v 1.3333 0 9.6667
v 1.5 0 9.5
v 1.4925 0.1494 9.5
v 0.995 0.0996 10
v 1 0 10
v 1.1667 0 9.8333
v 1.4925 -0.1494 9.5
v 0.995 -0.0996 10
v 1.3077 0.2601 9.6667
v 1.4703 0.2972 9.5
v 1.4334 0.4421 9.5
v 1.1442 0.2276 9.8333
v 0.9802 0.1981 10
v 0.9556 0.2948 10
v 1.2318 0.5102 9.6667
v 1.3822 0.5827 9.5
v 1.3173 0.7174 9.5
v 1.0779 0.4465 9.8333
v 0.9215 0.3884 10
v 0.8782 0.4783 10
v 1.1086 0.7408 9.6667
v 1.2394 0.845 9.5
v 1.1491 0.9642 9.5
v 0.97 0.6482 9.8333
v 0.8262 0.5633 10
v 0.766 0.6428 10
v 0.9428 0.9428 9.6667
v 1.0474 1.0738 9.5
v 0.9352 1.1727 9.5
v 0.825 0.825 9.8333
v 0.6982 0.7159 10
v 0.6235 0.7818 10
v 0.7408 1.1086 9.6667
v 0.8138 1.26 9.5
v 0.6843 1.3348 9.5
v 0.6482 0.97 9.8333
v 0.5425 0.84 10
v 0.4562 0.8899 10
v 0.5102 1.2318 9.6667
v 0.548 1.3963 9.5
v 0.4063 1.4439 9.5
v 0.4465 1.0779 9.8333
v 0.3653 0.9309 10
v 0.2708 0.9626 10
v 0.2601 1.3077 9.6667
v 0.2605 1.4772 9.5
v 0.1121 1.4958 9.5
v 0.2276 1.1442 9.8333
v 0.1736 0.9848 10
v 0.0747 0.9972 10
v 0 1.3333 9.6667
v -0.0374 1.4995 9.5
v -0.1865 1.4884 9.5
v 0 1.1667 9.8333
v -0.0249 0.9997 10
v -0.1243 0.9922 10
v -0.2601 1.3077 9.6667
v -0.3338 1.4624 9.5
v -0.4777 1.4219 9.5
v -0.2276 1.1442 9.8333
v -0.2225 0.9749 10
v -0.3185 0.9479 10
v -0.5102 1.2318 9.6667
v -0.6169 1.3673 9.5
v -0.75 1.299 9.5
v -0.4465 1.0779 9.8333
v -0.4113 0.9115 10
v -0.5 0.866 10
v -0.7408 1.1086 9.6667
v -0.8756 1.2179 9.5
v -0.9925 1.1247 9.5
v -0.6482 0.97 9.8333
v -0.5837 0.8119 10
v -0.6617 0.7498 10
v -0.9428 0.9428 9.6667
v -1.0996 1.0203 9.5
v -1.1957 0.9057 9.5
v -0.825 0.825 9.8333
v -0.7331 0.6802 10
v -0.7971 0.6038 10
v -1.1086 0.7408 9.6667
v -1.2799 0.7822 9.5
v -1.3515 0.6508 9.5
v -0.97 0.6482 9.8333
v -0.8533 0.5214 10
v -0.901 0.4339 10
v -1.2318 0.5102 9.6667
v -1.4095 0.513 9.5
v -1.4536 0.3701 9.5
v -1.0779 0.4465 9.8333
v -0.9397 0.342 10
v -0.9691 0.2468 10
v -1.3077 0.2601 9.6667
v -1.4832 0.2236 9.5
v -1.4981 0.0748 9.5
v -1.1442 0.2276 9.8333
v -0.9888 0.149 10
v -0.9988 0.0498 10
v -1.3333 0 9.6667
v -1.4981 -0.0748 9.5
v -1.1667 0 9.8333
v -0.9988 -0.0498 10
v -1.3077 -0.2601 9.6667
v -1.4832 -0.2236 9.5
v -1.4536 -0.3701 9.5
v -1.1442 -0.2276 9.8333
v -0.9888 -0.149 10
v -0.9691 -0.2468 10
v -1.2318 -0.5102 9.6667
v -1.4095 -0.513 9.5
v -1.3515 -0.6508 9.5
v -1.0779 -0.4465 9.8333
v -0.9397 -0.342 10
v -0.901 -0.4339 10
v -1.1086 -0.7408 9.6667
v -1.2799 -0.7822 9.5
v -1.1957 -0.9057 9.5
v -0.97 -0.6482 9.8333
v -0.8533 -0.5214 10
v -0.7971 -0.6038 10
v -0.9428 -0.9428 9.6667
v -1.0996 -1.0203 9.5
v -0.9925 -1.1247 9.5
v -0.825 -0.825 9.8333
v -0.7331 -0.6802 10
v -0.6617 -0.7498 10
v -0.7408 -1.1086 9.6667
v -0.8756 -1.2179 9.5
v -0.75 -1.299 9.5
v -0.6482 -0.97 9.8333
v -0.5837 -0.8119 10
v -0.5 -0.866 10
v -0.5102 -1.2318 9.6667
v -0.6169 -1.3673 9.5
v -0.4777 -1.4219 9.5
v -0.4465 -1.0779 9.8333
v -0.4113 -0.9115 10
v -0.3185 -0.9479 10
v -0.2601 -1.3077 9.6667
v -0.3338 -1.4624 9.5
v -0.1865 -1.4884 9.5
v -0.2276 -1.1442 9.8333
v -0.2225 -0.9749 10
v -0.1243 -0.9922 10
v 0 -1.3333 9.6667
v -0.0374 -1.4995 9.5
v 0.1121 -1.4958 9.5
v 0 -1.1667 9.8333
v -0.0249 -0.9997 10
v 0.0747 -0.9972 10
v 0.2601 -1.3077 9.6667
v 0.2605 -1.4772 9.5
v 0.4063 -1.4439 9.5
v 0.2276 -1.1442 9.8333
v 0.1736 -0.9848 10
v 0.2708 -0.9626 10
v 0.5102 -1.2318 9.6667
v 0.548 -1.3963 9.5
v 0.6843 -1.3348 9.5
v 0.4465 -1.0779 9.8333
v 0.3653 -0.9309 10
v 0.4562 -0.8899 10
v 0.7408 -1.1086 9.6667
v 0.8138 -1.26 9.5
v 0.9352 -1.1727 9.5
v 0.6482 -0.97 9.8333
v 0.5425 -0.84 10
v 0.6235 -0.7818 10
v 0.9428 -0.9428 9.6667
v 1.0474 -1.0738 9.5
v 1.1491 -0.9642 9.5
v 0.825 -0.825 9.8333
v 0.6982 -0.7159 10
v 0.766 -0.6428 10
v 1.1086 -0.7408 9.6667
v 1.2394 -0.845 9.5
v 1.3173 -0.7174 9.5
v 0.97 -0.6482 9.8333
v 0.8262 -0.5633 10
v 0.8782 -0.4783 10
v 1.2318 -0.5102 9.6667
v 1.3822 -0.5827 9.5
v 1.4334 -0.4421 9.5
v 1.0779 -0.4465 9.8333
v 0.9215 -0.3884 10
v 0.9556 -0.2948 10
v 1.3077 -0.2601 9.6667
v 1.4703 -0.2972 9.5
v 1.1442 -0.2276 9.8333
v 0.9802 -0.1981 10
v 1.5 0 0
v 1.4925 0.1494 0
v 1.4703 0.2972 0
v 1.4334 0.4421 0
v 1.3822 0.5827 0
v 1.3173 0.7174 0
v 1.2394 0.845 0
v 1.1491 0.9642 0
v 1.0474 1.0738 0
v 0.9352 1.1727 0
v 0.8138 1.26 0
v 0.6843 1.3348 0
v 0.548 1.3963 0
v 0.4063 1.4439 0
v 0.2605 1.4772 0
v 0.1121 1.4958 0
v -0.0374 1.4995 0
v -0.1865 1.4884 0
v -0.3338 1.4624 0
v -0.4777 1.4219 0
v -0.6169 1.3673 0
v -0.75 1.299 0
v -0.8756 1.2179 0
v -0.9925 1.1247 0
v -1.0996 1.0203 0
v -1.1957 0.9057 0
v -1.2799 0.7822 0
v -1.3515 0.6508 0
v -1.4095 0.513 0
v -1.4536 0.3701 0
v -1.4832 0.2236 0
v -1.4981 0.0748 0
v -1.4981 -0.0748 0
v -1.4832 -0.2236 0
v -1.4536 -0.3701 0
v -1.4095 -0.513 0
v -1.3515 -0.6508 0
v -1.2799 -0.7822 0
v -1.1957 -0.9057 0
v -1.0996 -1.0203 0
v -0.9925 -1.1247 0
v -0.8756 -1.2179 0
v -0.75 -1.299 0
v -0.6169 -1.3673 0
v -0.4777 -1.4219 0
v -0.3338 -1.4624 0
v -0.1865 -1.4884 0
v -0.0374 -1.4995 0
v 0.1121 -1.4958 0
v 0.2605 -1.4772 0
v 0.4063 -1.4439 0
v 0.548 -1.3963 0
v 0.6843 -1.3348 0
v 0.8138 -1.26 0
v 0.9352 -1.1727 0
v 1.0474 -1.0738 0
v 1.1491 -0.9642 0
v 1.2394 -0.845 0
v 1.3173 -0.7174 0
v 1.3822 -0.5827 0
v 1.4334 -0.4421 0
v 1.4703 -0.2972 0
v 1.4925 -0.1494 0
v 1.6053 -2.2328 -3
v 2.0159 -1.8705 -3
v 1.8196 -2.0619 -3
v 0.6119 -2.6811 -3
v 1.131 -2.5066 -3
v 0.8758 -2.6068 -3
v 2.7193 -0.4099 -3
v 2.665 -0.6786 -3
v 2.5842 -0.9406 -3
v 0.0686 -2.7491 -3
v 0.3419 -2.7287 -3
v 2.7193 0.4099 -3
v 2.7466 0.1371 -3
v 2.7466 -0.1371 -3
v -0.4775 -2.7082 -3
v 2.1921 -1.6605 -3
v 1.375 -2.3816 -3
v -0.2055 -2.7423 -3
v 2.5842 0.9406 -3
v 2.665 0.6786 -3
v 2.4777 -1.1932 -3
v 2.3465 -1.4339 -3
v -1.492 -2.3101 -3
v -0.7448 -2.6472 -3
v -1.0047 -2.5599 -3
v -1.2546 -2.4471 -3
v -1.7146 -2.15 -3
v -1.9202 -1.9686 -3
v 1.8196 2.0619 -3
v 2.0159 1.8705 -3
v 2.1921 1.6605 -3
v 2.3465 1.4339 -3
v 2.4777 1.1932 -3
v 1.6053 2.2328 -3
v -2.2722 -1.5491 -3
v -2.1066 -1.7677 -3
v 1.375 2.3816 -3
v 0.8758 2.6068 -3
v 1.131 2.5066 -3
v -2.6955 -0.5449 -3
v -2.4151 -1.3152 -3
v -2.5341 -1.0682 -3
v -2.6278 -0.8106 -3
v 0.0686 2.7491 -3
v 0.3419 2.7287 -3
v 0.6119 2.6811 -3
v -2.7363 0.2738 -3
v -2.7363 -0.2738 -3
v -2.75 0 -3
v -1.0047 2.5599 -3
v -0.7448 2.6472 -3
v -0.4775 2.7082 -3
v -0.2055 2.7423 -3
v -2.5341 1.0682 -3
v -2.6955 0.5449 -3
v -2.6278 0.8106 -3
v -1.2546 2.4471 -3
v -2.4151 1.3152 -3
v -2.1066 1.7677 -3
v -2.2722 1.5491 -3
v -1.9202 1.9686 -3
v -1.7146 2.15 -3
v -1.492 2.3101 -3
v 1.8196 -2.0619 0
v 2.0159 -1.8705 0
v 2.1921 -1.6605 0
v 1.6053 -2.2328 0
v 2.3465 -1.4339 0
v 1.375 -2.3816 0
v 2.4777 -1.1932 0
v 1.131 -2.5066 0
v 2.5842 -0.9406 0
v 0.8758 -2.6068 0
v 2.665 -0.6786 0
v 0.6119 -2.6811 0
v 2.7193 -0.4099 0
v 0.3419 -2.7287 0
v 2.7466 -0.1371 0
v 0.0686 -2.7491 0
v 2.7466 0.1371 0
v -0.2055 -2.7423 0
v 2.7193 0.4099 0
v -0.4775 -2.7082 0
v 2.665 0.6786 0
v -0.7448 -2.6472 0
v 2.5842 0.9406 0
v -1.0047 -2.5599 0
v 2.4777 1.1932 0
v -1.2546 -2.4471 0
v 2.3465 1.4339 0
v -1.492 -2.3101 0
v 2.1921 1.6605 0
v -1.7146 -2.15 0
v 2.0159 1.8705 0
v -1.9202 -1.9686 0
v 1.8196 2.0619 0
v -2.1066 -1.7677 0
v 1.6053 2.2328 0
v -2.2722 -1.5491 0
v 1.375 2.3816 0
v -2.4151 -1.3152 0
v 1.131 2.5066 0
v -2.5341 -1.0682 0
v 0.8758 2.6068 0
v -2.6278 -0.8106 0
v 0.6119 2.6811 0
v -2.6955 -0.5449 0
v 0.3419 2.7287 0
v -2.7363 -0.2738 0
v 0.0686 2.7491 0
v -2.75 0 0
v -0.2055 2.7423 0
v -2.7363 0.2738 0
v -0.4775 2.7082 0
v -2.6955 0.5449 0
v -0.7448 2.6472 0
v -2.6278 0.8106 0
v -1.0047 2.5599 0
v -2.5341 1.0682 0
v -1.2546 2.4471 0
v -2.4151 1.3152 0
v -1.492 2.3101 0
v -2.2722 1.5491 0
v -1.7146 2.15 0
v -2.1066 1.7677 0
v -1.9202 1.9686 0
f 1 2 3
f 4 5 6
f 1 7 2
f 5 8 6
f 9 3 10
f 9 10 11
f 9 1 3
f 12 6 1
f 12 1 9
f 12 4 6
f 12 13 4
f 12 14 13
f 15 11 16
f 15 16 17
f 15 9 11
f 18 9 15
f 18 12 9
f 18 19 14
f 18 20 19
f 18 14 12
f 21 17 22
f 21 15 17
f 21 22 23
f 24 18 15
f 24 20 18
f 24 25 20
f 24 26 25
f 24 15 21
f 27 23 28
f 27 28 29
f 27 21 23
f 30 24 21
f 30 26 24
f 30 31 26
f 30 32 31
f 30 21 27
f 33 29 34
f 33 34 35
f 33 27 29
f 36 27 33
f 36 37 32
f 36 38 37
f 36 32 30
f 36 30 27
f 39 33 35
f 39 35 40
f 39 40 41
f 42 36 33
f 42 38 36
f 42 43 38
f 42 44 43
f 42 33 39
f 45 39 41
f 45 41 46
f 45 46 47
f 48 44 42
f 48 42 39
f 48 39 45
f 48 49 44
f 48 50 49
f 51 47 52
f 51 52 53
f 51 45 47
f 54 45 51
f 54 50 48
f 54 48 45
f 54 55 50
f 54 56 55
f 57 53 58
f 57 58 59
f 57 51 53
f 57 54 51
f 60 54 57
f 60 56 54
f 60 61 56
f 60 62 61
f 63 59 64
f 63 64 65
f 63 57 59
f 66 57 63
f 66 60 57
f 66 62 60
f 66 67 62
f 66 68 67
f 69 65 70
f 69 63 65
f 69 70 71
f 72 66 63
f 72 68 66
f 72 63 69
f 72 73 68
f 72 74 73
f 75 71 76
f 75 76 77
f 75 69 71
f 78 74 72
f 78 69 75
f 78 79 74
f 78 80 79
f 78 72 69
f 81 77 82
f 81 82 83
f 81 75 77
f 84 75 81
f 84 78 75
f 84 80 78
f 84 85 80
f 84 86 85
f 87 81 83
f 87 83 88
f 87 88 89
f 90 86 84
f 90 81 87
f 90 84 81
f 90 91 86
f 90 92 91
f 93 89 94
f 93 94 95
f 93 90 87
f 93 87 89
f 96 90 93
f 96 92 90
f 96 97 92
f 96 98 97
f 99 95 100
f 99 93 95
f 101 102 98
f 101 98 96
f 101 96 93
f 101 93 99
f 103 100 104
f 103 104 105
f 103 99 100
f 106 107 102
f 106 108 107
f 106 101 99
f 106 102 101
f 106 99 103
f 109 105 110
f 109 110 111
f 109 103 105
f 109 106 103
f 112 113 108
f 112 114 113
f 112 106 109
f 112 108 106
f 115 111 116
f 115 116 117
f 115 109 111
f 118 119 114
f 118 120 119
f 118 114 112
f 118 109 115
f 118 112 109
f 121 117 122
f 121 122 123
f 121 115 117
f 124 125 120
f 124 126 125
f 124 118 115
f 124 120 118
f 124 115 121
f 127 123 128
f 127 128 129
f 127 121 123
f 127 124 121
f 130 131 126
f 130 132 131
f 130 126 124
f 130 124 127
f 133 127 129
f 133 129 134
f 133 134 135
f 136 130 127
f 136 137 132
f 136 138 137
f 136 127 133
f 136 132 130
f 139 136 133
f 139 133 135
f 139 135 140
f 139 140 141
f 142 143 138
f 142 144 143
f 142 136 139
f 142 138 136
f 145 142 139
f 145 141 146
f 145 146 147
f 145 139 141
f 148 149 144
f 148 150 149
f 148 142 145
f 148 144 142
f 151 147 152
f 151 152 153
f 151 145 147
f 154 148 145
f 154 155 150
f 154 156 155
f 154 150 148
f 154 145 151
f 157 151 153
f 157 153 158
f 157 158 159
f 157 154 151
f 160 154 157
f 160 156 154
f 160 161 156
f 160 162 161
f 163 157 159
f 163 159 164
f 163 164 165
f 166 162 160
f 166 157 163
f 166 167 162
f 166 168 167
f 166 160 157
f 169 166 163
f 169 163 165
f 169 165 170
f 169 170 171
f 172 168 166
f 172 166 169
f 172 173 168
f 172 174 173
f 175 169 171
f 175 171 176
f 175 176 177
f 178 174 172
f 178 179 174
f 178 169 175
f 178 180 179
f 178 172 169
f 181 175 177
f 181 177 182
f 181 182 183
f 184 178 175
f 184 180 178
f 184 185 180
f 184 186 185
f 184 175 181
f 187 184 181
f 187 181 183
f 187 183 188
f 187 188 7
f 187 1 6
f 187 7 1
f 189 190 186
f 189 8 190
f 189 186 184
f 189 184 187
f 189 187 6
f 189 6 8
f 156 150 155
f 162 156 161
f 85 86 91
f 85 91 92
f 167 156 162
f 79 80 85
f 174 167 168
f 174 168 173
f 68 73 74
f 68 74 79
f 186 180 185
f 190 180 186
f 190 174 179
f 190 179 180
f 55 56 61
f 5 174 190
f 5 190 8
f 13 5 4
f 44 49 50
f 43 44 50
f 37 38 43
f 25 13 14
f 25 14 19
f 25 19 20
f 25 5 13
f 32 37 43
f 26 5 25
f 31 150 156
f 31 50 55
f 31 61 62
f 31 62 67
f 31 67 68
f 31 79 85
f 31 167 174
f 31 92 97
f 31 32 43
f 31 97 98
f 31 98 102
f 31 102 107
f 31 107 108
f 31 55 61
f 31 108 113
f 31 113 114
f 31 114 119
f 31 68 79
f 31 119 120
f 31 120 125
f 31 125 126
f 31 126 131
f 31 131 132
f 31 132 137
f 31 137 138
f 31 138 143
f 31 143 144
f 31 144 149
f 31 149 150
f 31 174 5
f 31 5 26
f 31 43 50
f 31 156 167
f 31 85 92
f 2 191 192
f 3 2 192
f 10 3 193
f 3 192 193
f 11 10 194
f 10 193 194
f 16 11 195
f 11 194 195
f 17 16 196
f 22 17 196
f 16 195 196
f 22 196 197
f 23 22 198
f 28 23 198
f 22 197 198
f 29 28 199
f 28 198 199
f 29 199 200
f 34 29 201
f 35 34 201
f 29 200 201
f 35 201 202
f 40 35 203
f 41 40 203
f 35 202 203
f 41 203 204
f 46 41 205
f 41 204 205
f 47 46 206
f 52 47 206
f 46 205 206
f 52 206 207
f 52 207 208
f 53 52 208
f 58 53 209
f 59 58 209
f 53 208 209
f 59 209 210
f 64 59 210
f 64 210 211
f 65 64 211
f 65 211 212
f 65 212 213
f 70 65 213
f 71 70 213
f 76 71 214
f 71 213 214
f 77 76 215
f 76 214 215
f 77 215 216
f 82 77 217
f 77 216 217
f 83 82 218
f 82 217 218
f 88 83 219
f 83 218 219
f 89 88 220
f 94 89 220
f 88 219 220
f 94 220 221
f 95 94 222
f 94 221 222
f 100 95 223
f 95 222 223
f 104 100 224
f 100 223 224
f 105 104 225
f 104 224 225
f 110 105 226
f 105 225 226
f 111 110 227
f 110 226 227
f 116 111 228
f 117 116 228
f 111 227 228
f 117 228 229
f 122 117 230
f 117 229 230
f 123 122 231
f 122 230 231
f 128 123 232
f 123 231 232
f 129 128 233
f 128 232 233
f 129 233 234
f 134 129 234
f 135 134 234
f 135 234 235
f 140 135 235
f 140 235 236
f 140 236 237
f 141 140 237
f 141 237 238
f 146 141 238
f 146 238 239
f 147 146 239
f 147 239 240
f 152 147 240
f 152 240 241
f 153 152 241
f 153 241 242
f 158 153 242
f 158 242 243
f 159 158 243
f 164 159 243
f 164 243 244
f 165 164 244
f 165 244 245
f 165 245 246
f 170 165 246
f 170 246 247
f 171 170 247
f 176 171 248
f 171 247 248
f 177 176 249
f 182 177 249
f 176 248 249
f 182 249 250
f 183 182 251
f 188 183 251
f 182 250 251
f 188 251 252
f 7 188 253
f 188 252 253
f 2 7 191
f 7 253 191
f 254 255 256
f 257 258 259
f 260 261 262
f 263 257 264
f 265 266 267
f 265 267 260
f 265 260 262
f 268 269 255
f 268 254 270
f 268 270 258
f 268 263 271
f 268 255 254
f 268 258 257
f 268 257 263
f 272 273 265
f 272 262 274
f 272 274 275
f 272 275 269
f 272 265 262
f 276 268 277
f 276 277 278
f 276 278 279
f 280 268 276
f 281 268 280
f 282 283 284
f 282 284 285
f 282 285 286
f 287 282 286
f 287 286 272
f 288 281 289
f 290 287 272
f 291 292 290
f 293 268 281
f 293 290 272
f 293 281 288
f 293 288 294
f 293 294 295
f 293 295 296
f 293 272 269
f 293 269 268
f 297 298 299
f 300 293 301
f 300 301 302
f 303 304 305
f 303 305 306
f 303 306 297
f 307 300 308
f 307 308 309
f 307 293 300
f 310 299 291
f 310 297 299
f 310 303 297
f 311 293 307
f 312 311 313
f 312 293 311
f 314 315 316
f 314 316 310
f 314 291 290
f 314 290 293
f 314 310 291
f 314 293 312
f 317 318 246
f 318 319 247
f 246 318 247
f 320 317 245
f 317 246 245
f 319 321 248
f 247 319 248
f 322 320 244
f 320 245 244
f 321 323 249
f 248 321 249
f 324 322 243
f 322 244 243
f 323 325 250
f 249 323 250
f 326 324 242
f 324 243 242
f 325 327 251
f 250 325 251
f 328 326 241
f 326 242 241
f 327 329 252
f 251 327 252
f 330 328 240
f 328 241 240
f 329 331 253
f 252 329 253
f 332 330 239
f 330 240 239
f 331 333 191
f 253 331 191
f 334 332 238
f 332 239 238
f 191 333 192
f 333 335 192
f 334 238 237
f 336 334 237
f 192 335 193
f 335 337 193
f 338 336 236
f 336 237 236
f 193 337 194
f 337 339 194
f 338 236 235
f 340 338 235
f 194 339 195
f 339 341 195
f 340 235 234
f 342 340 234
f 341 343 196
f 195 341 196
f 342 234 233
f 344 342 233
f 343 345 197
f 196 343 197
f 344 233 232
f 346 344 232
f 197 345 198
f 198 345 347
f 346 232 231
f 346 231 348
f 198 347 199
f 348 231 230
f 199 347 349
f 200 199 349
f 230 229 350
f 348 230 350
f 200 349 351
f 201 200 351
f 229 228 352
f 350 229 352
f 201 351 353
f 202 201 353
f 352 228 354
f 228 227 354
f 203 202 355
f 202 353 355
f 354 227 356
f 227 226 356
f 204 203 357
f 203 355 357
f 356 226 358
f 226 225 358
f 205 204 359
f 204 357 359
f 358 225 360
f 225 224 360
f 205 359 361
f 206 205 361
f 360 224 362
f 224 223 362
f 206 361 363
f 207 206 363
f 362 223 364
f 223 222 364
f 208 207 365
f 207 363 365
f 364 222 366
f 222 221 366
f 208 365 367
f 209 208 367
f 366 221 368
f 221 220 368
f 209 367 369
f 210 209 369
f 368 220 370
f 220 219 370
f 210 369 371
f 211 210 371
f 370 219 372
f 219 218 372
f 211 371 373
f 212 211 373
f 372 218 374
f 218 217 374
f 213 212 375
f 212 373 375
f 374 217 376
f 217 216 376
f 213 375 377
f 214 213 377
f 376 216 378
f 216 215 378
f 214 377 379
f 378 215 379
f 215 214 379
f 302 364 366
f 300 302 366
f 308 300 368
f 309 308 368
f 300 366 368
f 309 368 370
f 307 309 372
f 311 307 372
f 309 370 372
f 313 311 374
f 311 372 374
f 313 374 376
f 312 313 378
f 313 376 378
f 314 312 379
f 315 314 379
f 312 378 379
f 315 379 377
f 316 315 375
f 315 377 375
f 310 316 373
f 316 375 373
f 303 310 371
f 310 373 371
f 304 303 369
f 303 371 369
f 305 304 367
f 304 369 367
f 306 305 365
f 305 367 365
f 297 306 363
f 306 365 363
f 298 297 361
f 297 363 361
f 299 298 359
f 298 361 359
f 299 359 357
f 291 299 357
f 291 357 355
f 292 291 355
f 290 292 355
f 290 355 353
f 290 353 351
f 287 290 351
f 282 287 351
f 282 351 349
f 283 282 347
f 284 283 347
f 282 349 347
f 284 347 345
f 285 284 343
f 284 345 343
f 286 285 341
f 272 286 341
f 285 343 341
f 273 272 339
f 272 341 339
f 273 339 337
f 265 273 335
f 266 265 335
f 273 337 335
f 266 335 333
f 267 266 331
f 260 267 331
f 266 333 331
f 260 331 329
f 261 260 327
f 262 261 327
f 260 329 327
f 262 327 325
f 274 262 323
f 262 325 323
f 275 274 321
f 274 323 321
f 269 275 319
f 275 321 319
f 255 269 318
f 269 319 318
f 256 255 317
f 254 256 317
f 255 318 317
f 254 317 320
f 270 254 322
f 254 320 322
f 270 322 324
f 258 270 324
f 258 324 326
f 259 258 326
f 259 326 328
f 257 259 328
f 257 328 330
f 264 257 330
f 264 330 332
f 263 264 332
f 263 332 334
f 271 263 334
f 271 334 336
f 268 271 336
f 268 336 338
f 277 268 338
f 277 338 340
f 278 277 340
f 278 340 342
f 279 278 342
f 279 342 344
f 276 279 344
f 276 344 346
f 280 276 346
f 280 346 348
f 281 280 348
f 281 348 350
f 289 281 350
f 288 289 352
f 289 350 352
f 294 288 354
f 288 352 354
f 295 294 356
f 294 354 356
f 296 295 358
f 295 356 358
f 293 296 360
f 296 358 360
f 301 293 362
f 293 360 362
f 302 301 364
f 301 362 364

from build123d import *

# Parameters (mm, degrees)
ESQUISSE2_R      = 1.5
EXTRUSION1_DEPTH = 10
ESQUISSE3_R      = 2.75
EXTRUSION2_DEPTH = 3
CHANFREIN1_SIZE  = 0.5


with BuildPart() as part:
    # Esquisse2 → Extrusion1 (new body)
    with BuildSketch(Plane.XY):
        Circle(ESQUISSE2_R)
    extrude(amount=EXTRUSION1_DEPTH)

    # Esquisse3 → Extrusion2 (add)
    with BuildSketch(Plane(origin=(0, 0, 0), x_dir=(-1, 0, 0), z_dir=(0, 0, -1))):
        Circle(ESQUISSE3_R)
    extrude(amount=EXTRUSION2_DEPTH)

    # Chanfrein1
    chanfrein1_edges = [part.edges().sort_by_distance(p)[0] for p in [
        (-1.5, 0, 10),
    ]]
    chamfer(chanfrein1_edges, length=CHANFREIN1_SIZE)


solid = part.part
